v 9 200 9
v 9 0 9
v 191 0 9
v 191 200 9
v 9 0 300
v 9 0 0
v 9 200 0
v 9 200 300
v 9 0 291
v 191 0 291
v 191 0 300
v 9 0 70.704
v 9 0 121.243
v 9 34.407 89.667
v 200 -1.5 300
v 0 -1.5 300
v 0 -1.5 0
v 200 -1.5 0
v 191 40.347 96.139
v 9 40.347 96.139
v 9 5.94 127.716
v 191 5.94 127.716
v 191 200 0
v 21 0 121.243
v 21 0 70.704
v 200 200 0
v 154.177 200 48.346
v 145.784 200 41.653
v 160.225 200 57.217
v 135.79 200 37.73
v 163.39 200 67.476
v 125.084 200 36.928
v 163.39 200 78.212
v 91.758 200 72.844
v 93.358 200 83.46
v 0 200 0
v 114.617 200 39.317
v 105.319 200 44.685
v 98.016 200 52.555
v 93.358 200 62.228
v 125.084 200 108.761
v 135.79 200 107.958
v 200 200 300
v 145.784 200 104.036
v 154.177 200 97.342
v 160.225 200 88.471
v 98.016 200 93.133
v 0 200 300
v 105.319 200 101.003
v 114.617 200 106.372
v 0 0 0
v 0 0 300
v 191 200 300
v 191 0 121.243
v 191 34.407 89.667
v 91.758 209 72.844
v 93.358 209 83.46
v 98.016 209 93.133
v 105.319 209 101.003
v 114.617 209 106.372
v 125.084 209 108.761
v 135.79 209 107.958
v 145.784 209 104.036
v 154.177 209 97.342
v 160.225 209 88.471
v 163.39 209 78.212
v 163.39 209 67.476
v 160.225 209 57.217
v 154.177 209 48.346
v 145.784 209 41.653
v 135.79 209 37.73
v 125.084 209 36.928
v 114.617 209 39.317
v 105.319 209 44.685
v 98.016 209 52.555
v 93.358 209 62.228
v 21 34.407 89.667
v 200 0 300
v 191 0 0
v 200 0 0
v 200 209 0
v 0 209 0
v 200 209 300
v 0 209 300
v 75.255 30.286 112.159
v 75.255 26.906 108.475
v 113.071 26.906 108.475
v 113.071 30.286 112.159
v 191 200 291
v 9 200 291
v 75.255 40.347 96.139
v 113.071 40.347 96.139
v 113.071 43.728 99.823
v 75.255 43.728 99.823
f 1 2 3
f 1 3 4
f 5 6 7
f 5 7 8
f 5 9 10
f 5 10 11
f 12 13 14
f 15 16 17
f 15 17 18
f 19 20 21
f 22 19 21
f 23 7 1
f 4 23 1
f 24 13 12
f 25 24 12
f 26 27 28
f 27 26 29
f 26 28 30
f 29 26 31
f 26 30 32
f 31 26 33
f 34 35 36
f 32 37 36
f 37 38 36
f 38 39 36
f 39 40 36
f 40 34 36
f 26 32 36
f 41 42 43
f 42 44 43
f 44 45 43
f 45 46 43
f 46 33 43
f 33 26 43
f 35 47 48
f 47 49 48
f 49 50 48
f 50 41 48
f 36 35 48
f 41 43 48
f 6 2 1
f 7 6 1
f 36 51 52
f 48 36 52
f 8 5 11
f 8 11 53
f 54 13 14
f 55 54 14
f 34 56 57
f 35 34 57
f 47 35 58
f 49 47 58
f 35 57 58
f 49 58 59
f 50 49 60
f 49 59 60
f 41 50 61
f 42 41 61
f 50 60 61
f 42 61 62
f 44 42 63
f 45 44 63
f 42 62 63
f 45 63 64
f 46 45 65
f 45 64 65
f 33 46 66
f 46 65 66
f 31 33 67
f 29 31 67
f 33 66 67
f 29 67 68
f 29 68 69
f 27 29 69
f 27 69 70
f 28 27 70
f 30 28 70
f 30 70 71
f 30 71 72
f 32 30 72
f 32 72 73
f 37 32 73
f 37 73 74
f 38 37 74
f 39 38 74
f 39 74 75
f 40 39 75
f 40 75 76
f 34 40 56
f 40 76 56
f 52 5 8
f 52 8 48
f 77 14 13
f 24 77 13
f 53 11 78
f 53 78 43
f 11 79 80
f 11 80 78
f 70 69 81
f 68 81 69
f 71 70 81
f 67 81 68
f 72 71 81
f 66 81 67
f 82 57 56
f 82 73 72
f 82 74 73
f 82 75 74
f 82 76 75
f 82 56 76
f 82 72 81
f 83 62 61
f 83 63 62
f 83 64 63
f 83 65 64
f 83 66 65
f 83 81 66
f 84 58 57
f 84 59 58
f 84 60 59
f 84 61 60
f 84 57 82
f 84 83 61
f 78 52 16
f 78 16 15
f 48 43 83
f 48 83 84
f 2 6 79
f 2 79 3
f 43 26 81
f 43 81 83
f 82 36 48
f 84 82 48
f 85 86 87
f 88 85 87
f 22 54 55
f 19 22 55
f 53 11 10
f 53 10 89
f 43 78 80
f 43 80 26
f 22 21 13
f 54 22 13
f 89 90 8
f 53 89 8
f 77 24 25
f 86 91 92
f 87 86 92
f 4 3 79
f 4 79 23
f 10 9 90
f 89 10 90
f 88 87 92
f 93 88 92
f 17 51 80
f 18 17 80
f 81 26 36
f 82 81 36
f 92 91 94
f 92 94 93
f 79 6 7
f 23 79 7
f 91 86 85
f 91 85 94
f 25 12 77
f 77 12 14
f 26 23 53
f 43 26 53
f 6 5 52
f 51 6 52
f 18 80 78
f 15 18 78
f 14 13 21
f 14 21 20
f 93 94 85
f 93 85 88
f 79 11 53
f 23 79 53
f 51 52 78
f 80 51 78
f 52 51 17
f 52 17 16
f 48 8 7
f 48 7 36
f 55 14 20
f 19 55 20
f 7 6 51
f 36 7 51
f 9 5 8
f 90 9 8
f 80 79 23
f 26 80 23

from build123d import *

# Parameters (mm, degrees)
F0_W      = 200
F0_H      = 300
F1_DEPTH  = 1.5
F2_W      = 9
F2_H      = 300
F3_DEPTH  = 200
F5_DEPTH  = 12
F7_DEPTH  = 182
F8_W      = 37.815571
F8_H      = 18.243985
F9_DEPTH  = 5
F10_W     = 200
F10_H     = 9
F11_DEPTH = 182
F12_W     = 200
F12_H     = 9
F13_DEPTH = 182
F14_W     = 200
F14_H     = 300
F15_DEPTH = 9
F16_W     = 200
F16_H     = 300
F17_DEPTH = 9
F18_R     = 36.017029
F19_DEPTH = 9


with BuildPart() as f1:
    # F0 (on Front) → F1 (new body)
    with BuildSketch(Plane.XZ):
        with Locations((100, 150)):
            Rectangle(F0_W, F0_H)
    extrude(amount=F1_DEPTH)


with BuildPart() as f3:
    # F2 (on face) → F3 (new body)
    with BuildSketch(Plane(origin=(0, 0, 0), x_dir=(-1, 0, 0), z_dir=(0, 1, 0))):
        with Locations((-4.5, 150)):
            Rectangle(F2_W, F2_H)
    extrude(amount=F3_DEPTH)


with BuildPart() as f5:
    # F4 (on face) → F5 (new body)
    with BuildSketch(Plane.YZ.offset(9)):
        Polygon((34.40683, 89.666866), (0, 121.243373), (0, 70.704266), align=None)
    extrude(amount=F5_DEPTH)


with BuildPart() as f7:
    # F6 (on face) → F7 (new body)
    with BuildSketch(Plane.YZ.offset(9)):
        Polygon((0, 121.243373), (34.40683, 89.666866), (40.346944, 96.139415), (5.940114, 127.715922), align=None)
    extrude(amount=F7_DEPTH)


with BuildPart() as f9:
    # F8 (on face) → F9 (new body)
    with BuildSketch(Plane(origin=(0, 66.33913, 72.285359), x_dir=(1, 0, 0), z_dir=(0, 0.676154, 0.73676))):
        with Locations((94.162829, -44.401019)):
            Rectangle(F8_W, F8_H)
    extrude(amount=F9_DEPTH)


with BuildPart() as f11:
    # F10 (on face) → F11 (new body)
    with BuildSketch(Plane.YZ.offset(9)):
        with Locations((100, 295.5)):
            Rectangle(F10_W, F10_H)
    extrude(amount=F11_DEPTH)


with BuildPart() as f13:
    # F12 (on face) → F13 (new body)
    with BuildSketch(Plane.YZ.offset(9)):
        with Locations((100, 4.5)):
            Rectangle(F12_W, F12_H)
    extrude(amount=F13_DEPTH)


with BuildPart() as f15:
    # F14 (on face) → F15 (new body)
    with BuildSketch(Plane.YZ.offset(191)):
        with Locations((100, 150)):
            Rectangle(F14_W, F14_H)
    extrude(amount=F15_DEPTH)


with BuildPart() as f17:
    # F16 (on face) → F17 (new body)
    with BuildSketch(Plane(origin=(0, 200, 0), x_dir=(-1, 0, 0), z_dir=(0, 1, 0))):
        with Locations((-100, 150)):
            Rectangle(F16_W, F16_H)
    extrude(amount=F17_DEPTH)

    # F18 (on face) → F19 (cut)
    with BuildSketch(Plane(origin=(0, 209, 0), x_dir=(-1, 0, 0), z_dir=(0, 1, 0))):
        with Locations((-127.775088, 72.844252)):
            Circle(F18_R)
    extrude(amount=-F19_DEPTH, mode=Mode.SUBTRACT)


solid = Compound([f1.part, f3.part, f5.part, f7.part, f9.part, f11.part, f13.part, f15.part, f17.part])
